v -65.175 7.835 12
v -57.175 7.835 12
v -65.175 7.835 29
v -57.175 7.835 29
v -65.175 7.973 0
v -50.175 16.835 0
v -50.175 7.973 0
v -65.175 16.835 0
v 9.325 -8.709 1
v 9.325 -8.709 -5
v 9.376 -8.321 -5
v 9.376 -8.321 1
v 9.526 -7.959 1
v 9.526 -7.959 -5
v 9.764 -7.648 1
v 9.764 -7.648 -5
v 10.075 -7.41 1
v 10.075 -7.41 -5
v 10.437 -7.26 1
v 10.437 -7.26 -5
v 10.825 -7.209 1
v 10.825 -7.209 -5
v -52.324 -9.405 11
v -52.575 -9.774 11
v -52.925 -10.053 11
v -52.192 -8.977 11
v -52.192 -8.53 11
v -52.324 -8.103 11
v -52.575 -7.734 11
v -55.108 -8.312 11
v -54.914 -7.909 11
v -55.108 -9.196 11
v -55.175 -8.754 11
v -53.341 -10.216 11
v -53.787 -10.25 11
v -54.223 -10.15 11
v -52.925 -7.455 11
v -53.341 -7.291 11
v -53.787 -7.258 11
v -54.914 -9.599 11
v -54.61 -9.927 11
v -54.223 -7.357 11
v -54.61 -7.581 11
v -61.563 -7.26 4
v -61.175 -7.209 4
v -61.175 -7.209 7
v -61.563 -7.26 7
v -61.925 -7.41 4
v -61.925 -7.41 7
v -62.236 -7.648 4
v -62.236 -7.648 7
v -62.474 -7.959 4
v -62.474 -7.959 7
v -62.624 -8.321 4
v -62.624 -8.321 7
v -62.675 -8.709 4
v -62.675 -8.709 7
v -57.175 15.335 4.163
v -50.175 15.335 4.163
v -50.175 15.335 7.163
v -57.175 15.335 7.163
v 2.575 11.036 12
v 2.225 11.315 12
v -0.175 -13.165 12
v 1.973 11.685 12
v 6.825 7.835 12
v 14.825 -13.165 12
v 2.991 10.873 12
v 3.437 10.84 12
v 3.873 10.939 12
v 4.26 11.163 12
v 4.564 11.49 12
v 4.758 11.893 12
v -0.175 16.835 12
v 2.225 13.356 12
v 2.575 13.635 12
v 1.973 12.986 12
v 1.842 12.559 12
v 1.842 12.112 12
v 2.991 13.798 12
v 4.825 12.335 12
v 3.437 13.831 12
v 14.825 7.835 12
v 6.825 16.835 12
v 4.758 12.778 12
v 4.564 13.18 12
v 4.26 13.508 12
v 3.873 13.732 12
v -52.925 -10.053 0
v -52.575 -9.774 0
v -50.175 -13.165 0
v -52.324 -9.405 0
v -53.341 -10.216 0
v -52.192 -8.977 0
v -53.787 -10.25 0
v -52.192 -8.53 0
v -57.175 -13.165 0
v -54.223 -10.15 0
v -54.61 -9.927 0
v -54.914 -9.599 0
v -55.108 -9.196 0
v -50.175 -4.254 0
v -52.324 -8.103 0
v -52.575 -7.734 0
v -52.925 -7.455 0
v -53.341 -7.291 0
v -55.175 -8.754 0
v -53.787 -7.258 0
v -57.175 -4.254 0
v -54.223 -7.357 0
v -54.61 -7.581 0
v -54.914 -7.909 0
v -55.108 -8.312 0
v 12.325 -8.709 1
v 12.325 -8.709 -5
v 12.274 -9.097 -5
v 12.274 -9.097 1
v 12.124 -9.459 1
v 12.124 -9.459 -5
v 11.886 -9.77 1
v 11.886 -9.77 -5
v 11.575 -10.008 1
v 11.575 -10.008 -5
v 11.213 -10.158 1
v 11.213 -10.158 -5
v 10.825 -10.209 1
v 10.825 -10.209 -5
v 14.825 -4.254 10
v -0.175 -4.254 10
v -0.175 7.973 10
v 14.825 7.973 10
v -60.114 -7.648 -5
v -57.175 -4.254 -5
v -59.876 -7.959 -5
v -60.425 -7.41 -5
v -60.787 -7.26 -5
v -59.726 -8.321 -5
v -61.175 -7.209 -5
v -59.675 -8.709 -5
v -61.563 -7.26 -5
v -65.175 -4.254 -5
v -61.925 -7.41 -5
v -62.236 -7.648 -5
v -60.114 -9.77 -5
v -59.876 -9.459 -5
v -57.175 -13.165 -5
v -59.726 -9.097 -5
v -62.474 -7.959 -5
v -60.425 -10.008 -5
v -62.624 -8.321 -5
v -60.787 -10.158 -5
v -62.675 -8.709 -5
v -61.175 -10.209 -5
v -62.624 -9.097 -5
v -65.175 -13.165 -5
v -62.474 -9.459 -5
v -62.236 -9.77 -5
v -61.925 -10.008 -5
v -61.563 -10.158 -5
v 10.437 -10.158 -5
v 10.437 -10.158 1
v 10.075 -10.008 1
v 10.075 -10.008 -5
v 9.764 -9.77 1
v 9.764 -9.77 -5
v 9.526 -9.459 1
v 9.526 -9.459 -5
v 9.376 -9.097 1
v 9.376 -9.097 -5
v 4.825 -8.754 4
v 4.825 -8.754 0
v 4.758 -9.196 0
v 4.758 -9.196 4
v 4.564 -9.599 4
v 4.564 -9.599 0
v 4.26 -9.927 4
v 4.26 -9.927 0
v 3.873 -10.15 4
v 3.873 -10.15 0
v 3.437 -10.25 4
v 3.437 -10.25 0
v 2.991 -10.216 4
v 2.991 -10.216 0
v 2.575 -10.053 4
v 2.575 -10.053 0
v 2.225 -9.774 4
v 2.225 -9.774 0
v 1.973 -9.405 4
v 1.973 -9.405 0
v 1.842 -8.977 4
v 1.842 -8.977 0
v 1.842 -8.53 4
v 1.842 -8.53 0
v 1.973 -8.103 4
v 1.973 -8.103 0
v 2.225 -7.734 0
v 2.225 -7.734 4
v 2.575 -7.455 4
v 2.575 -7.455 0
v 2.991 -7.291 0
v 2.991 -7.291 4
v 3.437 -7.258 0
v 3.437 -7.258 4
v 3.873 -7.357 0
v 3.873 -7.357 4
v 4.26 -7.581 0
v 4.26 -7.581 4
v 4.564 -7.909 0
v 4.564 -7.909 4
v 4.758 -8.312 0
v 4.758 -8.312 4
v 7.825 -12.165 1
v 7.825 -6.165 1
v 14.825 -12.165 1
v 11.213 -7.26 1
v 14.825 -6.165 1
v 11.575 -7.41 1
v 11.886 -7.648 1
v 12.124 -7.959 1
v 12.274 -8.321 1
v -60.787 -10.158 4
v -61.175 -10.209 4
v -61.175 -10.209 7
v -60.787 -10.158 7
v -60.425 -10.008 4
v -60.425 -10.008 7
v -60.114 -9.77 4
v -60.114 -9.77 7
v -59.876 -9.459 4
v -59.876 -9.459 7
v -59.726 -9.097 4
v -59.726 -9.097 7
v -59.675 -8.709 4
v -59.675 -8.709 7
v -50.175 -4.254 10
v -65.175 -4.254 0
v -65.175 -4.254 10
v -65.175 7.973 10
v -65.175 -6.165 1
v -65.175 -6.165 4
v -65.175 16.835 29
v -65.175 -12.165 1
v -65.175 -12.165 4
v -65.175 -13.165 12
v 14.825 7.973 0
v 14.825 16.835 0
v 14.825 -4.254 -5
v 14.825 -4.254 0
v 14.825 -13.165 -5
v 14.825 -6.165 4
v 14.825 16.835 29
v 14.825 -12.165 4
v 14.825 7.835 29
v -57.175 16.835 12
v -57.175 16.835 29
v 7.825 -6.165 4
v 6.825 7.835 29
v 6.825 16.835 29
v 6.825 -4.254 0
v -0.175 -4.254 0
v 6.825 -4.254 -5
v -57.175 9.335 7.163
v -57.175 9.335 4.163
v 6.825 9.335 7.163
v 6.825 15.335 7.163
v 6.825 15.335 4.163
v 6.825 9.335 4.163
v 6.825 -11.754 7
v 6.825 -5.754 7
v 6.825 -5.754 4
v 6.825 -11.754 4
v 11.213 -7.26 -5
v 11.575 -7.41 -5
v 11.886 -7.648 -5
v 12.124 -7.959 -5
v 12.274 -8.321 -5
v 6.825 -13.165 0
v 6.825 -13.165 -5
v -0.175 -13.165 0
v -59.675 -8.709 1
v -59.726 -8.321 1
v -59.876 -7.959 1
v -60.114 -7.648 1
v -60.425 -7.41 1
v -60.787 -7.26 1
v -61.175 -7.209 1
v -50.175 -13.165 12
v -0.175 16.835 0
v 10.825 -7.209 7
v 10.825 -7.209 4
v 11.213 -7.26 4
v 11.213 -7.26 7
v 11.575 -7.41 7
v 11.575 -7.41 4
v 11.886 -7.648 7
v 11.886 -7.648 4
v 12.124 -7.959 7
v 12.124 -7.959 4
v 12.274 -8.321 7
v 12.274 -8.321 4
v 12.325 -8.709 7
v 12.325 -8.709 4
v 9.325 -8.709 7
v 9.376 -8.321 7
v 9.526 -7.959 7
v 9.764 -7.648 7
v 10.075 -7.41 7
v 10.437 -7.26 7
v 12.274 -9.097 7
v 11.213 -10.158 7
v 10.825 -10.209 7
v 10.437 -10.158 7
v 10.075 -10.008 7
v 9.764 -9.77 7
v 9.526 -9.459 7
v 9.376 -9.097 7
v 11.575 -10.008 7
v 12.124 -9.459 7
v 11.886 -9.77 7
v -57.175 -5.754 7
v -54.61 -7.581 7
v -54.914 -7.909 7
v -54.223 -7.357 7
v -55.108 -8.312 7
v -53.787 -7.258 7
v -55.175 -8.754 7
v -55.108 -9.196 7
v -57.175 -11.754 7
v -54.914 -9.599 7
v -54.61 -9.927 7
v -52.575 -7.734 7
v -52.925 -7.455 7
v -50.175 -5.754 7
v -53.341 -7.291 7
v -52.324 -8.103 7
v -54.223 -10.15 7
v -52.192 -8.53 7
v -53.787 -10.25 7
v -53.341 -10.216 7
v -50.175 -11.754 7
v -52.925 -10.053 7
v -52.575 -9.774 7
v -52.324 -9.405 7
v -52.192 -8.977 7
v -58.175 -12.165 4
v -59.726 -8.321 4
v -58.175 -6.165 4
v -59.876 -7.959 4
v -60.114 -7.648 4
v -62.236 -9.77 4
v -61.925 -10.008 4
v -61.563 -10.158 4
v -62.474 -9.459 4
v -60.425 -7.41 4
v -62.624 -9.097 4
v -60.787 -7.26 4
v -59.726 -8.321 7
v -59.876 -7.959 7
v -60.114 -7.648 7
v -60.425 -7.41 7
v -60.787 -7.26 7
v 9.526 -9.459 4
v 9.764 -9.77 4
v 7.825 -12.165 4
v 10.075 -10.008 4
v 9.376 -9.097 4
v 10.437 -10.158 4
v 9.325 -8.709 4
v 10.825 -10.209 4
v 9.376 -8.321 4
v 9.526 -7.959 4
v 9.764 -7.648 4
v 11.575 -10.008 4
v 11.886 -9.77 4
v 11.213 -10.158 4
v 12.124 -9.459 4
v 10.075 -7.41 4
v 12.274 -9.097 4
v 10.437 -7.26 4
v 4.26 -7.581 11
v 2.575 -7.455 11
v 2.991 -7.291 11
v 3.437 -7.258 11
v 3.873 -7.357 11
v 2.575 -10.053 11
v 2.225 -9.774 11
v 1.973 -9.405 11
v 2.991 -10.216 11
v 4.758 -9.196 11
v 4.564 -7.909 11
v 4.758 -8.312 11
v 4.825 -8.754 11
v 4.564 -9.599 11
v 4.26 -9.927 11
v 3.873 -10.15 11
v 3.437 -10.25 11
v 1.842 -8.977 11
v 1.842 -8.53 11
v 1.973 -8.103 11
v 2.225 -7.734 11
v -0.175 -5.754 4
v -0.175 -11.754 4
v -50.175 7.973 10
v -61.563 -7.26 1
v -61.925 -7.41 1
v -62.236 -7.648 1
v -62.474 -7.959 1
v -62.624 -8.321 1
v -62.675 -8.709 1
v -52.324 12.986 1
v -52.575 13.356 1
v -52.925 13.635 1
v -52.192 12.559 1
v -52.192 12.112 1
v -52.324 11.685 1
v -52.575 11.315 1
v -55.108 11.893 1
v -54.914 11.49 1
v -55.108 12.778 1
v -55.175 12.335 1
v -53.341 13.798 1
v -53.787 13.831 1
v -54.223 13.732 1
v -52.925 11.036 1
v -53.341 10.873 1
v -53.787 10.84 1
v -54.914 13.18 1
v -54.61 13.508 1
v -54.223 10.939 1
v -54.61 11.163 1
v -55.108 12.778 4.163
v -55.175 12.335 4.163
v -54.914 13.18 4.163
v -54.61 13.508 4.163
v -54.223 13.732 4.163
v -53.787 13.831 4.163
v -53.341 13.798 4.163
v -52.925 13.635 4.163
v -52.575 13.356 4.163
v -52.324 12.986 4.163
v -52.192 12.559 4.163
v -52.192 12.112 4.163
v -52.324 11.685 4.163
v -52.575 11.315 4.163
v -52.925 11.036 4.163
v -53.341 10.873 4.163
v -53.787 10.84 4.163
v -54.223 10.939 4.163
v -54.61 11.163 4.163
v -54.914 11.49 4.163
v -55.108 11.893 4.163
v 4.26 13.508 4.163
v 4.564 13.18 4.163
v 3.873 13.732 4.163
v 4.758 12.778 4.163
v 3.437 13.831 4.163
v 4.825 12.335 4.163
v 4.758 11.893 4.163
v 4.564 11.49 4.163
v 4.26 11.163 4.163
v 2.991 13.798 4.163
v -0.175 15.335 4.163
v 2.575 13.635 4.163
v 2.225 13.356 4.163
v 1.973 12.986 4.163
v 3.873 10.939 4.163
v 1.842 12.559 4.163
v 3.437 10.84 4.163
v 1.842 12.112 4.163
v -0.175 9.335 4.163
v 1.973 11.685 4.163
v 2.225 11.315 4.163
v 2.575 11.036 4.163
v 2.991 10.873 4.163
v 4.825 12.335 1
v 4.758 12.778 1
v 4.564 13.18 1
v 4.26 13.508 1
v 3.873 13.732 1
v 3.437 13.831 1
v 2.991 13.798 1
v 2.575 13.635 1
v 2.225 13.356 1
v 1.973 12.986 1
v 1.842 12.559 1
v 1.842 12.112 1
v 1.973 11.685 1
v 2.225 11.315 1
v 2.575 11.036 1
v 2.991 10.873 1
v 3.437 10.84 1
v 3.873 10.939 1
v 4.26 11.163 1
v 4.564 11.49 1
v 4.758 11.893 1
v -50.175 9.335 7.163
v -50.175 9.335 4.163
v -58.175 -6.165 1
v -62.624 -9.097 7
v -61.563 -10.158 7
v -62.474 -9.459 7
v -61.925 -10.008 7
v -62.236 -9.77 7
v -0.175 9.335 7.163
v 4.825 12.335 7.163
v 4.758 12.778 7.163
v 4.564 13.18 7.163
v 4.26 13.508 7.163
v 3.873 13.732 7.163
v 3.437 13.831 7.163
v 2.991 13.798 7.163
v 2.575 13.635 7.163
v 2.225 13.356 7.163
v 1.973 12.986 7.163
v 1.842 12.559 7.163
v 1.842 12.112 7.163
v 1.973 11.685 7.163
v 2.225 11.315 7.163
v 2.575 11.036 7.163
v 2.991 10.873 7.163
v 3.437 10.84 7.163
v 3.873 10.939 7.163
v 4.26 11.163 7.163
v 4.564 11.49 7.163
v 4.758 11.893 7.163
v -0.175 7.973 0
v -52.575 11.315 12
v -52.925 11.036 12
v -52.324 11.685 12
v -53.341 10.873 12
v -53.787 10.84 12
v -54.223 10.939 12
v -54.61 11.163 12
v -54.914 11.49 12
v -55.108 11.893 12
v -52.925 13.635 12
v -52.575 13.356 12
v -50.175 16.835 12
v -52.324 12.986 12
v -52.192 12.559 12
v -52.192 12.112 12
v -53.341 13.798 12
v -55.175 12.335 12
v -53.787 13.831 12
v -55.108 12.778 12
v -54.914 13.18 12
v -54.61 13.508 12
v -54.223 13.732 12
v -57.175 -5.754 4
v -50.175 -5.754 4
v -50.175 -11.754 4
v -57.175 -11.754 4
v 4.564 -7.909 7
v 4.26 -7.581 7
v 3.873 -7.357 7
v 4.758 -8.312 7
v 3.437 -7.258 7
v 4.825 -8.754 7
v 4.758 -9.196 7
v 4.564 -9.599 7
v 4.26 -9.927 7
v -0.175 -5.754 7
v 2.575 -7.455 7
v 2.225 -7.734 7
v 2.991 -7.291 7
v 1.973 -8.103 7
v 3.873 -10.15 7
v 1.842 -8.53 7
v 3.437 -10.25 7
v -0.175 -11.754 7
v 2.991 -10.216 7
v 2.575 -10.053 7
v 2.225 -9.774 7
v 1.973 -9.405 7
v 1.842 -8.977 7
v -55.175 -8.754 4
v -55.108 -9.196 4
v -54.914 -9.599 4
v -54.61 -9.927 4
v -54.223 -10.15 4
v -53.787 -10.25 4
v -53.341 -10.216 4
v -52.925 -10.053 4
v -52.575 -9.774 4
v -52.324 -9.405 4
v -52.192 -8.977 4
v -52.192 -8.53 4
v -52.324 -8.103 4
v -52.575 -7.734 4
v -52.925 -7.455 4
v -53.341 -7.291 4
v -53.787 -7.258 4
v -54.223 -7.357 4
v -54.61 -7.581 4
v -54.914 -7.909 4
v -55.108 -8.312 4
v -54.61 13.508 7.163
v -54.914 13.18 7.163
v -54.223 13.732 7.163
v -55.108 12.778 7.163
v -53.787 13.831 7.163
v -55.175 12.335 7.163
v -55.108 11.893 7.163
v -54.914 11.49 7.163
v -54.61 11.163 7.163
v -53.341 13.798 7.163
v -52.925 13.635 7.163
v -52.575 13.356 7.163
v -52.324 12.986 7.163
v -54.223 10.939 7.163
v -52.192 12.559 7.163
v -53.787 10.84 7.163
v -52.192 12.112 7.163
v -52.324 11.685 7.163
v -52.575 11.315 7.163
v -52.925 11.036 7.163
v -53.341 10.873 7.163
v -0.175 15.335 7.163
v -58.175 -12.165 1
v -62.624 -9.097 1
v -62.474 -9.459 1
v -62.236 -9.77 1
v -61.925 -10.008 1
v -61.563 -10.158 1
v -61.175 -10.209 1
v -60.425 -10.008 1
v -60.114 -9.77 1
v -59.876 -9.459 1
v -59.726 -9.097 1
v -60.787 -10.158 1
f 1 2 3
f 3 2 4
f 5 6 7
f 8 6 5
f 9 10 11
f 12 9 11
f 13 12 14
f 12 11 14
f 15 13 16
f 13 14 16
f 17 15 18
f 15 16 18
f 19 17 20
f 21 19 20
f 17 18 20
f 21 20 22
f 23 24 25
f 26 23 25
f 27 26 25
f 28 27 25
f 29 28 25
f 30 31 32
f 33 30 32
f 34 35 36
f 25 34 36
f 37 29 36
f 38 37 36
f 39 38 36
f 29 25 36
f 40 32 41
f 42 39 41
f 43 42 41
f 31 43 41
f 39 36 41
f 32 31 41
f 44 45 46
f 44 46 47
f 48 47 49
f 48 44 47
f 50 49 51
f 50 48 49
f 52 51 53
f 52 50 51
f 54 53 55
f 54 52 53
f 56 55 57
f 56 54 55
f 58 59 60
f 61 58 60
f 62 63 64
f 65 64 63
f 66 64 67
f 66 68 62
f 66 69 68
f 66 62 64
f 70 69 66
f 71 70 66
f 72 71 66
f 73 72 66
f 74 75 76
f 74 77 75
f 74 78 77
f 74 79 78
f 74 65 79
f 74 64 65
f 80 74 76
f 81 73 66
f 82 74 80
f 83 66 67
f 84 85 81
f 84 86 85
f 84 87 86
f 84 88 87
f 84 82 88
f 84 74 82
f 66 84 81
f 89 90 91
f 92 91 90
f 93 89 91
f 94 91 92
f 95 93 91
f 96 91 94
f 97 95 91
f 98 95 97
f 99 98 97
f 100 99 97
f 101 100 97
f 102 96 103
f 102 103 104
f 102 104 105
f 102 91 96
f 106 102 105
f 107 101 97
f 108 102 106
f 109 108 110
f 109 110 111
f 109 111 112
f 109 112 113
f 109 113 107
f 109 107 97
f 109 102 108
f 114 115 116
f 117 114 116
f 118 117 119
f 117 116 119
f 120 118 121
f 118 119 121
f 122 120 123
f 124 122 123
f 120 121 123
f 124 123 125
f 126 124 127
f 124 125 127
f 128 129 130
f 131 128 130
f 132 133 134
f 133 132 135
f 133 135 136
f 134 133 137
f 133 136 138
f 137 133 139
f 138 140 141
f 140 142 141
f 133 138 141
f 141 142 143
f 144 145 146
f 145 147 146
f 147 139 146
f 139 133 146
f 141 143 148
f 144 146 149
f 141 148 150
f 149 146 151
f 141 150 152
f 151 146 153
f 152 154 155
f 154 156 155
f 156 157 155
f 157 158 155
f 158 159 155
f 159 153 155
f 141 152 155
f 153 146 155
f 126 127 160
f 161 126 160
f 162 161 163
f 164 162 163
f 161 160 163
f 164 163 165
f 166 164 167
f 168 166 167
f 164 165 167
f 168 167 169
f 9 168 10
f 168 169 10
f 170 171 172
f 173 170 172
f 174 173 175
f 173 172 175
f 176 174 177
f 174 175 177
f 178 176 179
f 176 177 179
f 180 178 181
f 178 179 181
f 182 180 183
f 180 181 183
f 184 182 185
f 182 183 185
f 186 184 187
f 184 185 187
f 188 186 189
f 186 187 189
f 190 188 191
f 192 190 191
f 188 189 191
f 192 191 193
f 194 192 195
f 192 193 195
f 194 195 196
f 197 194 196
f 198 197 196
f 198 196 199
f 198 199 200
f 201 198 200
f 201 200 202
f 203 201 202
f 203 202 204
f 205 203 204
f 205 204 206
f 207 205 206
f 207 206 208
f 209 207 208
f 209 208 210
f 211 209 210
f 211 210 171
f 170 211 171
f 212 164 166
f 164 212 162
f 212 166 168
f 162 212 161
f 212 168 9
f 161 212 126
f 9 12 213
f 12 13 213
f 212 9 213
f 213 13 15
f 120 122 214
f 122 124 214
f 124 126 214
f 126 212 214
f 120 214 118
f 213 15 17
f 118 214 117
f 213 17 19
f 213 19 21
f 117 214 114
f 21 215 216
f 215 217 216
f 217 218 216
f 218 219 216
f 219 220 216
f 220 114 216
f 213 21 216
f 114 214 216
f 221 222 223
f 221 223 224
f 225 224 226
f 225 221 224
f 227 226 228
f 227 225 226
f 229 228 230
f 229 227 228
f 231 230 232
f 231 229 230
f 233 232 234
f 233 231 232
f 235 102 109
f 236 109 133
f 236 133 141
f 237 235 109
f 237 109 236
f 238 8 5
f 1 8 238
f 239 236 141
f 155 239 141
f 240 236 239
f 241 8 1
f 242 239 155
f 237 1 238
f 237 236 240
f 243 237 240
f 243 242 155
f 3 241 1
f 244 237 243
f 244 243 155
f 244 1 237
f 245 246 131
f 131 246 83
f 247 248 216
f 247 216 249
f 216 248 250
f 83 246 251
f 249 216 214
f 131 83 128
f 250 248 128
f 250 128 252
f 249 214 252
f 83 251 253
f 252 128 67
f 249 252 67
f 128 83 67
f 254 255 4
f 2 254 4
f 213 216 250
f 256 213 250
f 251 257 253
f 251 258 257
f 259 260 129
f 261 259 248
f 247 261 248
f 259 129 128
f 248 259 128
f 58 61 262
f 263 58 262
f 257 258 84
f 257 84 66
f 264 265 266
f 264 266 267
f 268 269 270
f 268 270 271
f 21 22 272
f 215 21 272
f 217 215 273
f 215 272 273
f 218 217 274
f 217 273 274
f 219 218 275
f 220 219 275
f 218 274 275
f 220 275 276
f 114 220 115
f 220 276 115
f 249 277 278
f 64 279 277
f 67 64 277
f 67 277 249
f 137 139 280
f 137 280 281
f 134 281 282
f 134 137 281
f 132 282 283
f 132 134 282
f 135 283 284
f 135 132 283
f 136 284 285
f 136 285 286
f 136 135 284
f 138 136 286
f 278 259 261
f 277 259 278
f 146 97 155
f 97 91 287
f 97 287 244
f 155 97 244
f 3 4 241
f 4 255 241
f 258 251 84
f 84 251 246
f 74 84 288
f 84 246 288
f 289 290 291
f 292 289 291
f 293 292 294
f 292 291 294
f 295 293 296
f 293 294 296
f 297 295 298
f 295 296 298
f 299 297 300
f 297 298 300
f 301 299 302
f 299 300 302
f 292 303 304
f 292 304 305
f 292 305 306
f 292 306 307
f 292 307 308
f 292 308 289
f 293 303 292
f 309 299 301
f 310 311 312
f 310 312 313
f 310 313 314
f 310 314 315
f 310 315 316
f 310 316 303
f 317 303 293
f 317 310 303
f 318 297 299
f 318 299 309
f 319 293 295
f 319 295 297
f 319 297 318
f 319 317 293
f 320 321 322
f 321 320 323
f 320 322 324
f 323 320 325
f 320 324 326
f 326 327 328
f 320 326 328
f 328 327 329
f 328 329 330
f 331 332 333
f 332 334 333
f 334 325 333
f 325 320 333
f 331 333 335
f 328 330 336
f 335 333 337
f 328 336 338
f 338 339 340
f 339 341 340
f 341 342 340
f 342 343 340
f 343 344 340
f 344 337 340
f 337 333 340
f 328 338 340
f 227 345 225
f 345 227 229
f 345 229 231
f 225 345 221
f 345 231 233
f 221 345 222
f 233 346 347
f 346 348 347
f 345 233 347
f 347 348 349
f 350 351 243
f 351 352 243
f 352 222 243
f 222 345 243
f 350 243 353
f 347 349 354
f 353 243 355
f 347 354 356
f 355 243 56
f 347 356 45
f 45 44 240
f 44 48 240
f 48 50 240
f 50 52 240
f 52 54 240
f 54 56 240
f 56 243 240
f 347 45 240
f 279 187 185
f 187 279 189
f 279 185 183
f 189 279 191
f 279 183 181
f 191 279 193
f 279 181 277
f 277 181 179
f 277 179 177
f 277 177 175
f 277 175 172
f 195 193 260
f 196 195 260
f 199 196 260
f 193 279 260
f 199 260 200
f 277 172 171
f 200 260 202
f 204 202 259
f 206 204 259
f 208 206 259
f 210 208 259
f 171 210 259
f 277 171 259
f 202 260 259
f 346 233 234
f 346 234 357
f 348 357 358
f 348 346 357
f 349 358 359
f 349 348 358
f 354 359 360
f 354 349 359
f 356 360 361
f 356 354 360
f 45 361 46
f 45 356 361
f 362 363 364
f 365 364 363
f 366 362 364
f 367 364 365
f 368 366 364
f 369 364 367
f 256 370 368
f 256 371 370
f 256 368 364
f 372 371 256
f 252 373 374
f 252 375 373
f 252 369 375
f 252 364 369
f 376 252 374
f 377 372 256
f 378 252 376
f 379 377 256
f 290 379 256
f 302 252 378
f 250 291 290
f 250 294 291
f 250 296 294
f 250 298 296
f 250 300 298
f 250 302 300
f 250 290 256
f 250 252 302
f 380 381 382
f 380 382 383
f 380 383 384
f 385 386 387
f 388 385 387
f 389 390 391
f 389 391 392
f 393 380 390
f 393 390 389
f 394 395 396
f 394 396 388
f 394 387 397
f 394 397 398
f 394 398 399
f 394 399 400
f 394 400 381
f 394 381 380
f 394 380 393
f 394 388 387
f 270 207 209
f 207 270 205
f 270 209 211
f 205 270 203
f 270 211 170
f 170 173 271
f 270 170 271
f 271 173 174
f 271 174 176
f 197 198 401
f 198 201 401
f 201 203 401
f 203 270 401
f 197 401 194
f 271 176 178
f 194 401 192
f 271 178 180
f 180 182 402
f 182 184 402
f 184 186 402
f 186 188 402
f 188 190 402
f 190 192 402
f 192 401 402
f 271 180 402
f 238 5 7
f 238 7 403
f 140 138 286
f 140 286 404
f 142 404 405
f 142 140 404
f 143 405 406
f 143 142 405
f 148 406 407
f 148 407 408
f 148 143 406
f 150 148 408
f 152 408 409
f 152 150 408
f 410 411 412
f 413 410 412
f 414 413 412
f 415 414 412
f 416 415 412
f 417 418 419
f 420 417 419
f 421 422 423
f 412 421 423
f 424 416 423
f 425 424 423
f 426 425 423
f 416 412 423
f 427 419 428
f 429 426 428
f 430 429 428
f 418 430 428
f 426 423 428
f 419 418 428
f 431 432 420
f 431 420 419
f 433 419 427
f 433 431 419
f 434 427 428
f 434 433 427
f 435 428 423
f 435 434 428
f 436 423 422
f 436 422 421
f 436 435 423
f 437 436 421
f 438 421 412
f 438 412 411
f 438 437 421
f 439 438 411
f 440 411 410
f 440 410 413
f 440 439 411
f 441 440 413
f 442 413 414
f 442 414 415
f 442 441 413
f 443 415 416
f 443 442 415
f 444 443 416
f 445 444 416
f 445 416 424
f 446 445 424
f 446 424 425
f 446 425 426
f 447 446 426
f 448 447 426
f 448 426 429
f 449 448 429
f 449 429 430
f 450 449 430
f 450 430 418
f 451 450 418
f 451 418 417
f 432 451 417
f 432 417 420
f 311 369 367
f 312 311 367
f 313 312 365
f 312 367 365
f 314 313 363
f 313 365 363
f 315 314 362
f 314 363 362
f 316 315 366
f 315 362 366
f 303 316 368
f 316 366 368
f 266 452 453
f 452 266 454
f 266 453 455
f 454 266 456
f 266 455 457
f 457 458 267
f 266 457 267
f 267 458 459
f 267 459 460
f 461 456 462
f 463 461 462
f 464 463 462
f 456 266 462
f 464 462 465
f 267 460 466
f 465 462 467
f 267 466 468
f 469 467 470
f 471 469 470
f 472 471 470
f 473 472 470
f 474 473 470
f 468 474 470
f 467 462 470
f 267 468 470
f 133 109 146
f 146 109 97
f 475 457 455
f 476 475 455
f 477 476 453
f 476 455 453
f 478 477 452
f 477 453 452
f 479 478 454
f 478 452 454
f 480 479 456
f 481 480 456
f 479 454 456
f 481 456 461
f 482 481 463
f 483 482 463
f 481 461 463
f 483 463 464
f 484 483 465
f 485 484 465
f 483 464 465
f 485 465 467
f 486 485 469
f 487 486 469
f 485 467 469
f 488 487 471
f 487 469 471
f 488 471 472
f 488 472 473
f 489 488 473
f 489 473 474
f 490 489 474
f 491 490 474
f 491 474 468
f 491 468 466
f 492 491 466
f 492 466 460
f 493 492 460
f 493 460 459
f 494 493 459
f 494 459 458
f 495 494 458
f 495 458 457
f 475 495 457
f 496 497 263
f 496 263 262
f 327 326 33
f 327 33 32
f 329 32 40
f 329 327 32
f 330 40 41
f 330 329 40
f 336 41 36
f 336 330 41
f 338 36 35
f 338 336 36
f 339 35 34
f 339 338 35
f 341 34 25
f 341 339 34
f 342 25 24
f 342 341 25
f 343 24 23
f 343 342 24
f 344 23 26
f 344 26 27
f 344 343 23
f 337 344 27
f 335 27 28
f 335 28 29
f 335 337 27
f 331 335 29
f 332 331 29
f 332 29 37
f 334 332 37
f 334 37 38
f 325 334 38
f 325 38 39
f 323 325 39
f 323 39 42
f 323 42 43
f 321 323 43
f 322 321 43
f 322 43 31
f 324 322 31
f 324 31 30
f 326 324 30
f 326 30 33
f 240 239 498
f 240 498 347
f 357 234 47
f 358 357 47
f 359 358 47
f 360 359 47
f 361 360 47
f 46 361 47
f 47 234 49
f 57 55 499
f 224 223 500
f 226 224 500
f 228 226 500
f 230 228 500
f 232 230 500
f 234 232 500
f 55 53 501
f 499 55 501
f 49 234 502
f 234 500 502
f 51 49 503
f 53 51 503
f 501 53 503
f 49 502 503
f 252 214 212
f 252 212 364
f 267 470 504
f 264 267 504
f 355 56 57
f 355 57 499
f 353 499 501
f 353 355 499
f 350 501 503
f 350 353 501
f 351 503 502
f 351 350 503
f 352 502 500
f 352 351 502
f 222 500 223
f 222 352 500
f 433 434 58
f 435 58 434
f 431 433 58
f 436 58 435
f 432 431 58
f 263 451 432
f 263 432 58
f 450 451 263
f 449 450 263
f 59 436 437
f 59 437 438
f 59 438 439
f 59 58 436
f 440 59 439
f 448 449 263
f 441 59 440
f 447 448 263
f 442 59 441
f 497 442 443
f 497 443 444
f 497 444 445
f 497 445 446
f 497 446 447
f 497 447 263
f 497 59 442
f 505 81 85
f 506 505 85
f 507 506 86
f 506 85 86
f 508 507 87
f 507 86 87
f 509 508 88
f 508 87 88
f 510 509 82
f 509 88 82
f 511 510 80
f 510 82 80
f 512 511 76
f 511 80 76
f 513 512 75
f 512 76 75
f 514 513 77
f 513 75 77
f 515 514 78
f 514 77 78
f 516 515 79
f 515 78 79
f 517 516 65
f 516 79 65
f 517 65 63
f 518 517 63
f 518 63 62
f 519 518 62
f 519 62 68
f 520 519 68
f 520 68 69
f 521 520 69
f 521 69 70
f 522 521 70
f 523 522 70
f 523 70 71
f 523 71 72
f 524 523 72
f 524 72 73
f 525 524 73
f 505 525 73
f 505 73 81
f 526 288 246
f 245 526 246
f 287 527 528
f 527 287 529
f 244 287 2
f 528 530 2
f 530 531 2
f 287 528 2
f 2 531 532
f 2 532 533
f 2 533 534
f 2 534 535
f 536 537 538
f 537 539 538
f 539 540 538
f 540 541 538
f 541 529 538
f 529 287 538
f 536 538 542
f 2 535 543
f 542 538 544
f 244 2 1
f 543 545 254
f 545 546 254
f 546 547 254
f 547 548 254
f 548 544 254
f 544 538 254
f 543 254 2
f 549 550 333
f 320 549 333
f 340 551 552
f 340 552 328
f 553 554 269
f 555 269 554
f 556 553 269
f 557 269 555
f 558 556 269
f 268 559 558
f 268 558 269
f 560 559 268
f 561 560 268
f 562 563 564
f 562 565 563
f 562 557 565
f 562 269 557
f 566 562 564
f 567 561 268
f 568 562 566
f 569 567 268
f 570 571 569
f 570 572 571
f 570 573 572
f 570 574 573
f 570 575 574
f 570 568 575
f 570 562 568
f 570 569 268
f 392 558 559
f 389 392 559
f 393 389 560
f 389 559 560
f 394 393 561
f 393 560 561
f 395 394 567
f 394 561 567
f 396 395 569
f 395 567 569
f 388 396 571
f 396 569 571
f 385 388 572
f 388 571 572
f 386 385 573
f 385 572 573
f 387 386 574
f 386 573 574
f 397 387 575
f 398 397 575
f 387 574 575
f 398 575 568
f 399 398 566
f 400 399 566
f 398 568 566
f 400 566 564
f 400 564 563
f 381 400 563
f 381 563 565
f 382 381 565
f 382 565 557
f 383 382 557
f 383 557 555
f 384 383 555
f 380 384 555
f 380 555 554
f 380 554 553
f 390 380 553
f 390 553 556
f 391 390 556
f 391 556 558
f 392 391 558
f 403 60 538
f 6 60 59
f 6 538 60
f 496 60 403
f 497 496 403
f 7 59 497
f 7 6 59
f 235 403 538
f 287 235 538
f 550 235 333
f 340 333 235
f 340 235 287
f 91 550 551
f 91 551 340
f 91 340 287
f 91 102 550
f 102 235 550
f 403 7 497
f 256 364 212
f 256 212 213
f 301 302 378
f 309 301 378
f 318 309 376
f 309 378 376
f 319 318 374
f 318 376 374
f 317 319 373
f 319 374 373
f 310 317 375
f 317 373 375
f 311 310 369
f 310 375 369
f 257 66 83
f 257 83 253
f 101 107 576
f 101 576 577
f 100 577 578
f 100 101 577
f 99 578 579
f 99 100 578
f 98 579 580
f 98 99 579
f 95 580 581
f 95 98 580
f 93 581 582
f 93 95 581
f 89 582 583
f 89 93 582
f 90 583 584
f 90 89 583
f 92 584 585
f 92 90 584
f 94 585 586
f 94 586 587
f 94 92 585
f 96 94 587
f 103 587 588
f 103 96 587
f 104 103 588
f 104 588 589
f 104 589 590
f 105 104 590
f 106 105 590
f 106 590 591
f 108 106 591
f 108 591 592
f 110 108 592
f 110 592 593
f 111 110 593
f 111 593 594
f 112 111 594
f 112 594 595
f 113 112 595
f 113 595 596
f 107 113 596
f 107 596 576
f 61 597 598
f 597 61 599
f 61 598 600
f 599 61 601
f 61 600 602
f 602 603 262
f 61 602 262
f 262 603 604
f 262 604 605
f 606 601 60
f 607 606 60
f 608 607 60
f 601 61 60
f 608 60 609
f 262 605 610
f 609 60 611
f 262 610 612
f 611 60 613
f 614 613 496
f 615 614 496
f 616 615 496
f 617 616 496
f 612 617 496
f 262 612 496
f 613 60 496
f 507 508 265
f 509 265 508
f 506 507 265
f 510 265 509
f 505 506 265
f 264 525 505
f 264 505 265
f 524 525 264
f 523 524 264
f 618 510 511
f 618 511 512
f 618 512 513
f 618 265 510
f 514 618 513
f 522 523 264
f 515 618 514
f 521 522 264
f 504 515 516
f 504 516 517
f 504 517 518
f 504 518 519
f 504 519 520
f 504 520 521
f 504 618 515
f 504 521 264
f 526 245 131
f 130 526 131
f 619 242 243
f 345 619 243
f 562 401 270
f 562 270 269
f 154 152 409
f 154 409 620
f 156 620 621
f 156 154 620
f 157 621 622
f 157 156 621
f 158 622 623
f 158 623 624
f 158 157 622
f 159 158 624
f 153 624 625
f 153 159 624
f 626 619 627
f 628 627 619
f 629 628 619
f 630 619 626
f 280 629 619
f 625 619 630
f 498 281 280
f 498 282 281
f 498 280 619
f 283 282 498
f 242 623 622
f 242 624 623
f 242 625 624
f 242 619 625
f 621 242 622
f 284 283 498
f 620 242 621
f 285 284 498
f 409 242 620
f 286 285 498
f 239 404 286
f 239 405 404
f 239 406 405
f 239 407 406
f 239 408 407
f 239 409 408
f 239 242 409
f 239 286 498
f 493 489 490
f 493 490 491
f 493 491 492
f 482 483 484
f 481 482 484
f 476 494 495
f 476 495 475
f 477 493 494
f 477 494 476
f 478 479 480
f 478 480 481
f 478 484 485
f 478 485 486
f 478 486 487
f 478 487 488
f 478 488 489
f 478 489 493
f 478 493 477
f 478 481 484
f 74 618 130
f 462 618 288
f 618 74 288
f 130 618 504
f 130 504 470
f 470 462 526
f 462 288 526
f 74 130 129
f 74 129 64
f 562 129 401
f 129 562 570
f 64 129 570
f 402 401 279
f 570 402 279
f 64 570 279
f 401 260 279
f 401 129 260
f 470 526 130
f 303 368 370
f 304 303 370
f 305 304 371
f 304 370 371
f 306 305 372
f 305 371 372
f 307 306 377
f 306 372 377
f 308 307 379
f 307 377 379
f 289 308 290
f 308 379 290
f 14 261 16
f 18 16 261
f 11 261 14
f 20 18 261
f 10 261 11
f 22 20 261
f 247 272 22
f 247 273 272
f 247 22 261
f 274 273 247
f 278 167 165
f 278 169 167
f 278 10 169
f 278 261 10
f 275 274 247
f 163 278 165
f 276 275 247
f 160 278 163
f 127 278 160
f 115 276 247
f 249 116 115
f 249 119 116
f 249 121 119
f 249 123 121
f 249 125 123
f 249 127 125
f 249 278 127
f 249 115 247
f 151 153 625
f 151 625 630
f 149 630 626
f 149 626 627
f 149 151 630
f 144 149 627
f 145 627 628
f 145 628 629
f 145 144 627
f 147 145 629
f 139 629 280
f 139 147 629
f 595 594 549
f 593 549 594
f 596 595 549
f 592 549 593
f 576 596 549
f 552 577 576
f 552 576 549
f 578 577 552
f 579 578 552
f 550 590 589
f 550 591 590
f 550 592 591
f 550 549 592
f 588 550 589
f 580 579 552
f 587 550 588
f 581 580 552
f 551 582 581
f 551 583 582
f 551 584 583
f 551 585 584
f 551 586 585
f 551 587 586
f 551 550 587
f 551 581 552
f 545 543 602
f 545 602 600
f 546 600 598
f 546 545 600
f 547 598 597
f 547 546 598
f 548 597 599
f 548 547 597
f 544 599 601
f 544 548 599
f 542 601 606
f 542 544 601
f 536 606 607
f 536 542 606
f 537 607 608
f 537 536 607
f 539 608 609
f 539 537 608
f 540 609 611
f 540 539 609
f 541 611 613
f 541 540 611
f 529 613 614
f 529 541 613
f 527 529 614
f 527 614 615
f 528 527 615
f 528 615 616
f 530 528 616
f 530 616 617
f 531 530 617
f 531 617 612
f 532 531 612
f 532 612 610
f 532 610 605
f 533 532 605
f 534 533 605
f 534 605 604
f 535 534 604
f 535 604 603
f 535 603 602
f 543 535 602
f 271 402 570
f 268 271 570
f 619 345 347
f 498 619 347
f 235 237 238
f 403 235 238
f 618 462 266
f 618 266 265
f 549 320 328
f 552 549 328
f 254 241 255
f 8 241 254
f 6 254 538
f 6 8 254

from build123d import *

# Parameters (mm, degrees)
F1_DEPTH  = 29
F0_W      = 1
F0_H      = 21
F2_DEPTH  = 29
F3_DEPTH  = 12
F4_W      = 12.2264070287
F4_H      = 10
F5_DEPTH  = 15
F6_DEPTH  = 16
F7_W      = 8
F7_H      = 8.9107662588
F8_DEPTH  = 5
F10_DEPTH = 12
F11_W     = 6
F11_H     = 3
F12_DEPTH = 7
F13_W     = 6
F13_H     = 3
F14_DEPTH = 7
F15_R     = 1.5
F16_DEPTH = 11
F17_DEPTH = 7
F18_R     = 1.5
F19_DEPTH = 11
F20_W     = 21
F20_H     = 17
F21_DEPTH = 1


with BuildPart() as f1:
    # F0 (on Top) → F1 (new body)
    with BuildSketch(Plane.XY):
        Polygon((14.8249259219, 16.8354657665), (6.8249259219, 16.8354657665), (6.8249259219, 7.8354657665), (13.8249259219, 7.8354657665), (14.8249259219, 7.8354657665), align=None)
    extrude(amount=F1_DEPTH)

    # F0 (on Top) → F2 (join)
    with BuildSketch(Plane.XY):
        with Locations((14.3249259219, -2.6645342335)):
            Rectangle(F0_W, F0_H)
    extrude(amount=F2_DEPTH)

    # F0 (on Top) → F3 (join)
    with BuildSketch(Plane.XY):
        Polygon((6.8249259219, 16.8354657665), (-0.1750740781, 16.8354657665), (-0.1750740781, -13.1645342335), (13.8249259219, -13.1645342335), (13.8249259219, 7.8354657665), (6.8249259219, 7.8354657665), align=None)
    extrude(amount=F3_DEPTH)

    # F4 (on Right) → F5 (join)
    with BuildSketch(Plane.YZ):
        with Locations((1.8594355397, 5)):
            Rectangle(F4_W, F4_H)
    extrude(amount=F5_DEPTH)

    # F6 (cut): a face of the model
    f6_faces = [f1.faces().sort_by_distance(p)[0] for p in [
        (15, 1.8594355397, 5),
    ]]
    extrude(f6_faces, amount=-F6_DEPTH, mode=Mode.SUBTRACT)

    # F7 (on face) → F8 (join)
    with BuildSketch(Plane(origin=(0, 0, 0), x_dir=(1, 0, 0), z_dir=(0, 0, -1))):
        with Locations((10.8249259219, 8.7091511041)):
            Rectangle(F7_W, F7_H)
    extrude(amount=F8_DEPTH)

    # F9 (on face) → F10 (cut)
    with BuildSketch(Plane(origin=(0, 0, -5), x_dir=(1, 0, 0), z_dir=(0, 0, -1))):
        with BuildLine():
            ThreePointArc((12.3249259219, 8.7091511041), (11.8855860936, 9.7698112759), (10.8249259219, 10.2091511041))
            Line((10.8249259219, 10.2091511041), (10.8249259219, 8.7091511041))
            Line((10.8249259219, 8.7091511041), (12.3249259219, 8.7091511041))
        make_face()
        with BuildLine():
            Line((12.3249259219, 8.7091511041), (10.8249259219, 8.7091511041))
            Line((10.8249259219, 8.7091511041), (10.8249259219, 7.2091511041))
            ThreePointArc((10.8249259219, 7.2091511041), (11.8855860936, 7.6484909323), (12.3249259219, 8.7091511041))
        make_face()
        with BuildLine():
            Line((10.8249259219, 8.7091511041), (9.3249259219, 8.7091511041))
            ThreePointArc((9.3249259219, 8.7091511041), (9.7642657501, 7.6484909323), (10.8249259219, 7.2091511041))
            Line((10.8249259219, 7.2091511041), (10.8249259219, 8.7091511041))
        make_face()
        with BuildLine():
            Line((10.8249259219, 8.7091511041), (10.8249259219, 10.2091511041))
            ThreePointArc((10.8249259219, 10.2091511041), (9.7642657501, 9.7698112759), (9.3249259219, 8.7091511041))
            Line((9.3249259219, 8.7091511041), (10.8249259219, 8.7091511041))
        make_face()
    extrude(amount=-F10_DEPTH, mode=Mode.SUBTRACT)

    # F11 (on face) → F12 (cut)
    with BuildSketch(Plane.YZ.offset(14.8249259219)):
        with Locations((-9.1645342335, 2.5)):
            Rectangle(F11_W, F11_H)
    extrude(amount=-F12_DEPTH, mode=Mode.SUBTRACT)

    # F13 (on face) → F14 (cut)
    with BuildSketch(Plane(origin=(-0.1750740781, 0, 0), x_dir=(0, -1, 0), z_dir=(-1, 0, 0))):
        with Locations((-12.3354657665, 5.663232632)):
            Rectangle(F13_W, F13_H)
    extrude(amount=-F14_DEPTH, mode=Mode.SUBTRACT)

    # F15 (on face) → F16 (cut)
    with BuildSketch(Plane.XY.offset(12)):
        with Locations((3.3249259219, 12.3354657665)):
            Circle(F15_R)
    extrude(amount=-F16_DEPTH, mode=Mode.SUBTRACT)

    # F13 (on face) → F17 (cut)
    with BuildSketch(Plane(origin=(-0.1750740781, 0, 0), x_dir=(0, -1, 0), z_dir=(-1, 0, 0))):
        with Locations((-12.3354657665, 5.663232632)):
            Rectangle(F13_W, F13_H)
        with Locations((8.7537679747, 5.5)):
            Rectangle(F13_W, F13_H)
    extrude(amount=-F17_DEPTH, mode=Mode.SUBTRACT)

    # F18 (on face) → F19 (cut)
    with BuildSketch(Plane(origin=(0, 0, 0), x_dir=(1, 0, 0), z_dir=(0, 0, -1))):
        with Locations((3.3249259219, 8.7537679747)):
            Circle(F18_R)
    extrude(amount=-F19_DEPTH, mode=Mode.SUBTRACT)

    # F20 (on face) → F21 (cut)
    with BuildSketch(Plane(origin=(13.8249259219, 0, 0), x_dir=(0, -1, 0), z_dir=(-1, 0, 0))):
        with Locations((2.6645342335, 20.5)):
            Rectangle(F20_W, F20_H)
    extrude(amount=-F21_DEPTH, mode=Mode.SUBTRACT)


with BuildPart() as f23_1:
    # F23: instance of F1
    add(f1.part.mirror(Plane(origin=(-25.1750740781, 1.8289005766, 6.6807209955), x_dir=(0, -1, 0), z_dir=(-1, 0, 0))))


solid = Compound([f1.part, f23_1.part])
